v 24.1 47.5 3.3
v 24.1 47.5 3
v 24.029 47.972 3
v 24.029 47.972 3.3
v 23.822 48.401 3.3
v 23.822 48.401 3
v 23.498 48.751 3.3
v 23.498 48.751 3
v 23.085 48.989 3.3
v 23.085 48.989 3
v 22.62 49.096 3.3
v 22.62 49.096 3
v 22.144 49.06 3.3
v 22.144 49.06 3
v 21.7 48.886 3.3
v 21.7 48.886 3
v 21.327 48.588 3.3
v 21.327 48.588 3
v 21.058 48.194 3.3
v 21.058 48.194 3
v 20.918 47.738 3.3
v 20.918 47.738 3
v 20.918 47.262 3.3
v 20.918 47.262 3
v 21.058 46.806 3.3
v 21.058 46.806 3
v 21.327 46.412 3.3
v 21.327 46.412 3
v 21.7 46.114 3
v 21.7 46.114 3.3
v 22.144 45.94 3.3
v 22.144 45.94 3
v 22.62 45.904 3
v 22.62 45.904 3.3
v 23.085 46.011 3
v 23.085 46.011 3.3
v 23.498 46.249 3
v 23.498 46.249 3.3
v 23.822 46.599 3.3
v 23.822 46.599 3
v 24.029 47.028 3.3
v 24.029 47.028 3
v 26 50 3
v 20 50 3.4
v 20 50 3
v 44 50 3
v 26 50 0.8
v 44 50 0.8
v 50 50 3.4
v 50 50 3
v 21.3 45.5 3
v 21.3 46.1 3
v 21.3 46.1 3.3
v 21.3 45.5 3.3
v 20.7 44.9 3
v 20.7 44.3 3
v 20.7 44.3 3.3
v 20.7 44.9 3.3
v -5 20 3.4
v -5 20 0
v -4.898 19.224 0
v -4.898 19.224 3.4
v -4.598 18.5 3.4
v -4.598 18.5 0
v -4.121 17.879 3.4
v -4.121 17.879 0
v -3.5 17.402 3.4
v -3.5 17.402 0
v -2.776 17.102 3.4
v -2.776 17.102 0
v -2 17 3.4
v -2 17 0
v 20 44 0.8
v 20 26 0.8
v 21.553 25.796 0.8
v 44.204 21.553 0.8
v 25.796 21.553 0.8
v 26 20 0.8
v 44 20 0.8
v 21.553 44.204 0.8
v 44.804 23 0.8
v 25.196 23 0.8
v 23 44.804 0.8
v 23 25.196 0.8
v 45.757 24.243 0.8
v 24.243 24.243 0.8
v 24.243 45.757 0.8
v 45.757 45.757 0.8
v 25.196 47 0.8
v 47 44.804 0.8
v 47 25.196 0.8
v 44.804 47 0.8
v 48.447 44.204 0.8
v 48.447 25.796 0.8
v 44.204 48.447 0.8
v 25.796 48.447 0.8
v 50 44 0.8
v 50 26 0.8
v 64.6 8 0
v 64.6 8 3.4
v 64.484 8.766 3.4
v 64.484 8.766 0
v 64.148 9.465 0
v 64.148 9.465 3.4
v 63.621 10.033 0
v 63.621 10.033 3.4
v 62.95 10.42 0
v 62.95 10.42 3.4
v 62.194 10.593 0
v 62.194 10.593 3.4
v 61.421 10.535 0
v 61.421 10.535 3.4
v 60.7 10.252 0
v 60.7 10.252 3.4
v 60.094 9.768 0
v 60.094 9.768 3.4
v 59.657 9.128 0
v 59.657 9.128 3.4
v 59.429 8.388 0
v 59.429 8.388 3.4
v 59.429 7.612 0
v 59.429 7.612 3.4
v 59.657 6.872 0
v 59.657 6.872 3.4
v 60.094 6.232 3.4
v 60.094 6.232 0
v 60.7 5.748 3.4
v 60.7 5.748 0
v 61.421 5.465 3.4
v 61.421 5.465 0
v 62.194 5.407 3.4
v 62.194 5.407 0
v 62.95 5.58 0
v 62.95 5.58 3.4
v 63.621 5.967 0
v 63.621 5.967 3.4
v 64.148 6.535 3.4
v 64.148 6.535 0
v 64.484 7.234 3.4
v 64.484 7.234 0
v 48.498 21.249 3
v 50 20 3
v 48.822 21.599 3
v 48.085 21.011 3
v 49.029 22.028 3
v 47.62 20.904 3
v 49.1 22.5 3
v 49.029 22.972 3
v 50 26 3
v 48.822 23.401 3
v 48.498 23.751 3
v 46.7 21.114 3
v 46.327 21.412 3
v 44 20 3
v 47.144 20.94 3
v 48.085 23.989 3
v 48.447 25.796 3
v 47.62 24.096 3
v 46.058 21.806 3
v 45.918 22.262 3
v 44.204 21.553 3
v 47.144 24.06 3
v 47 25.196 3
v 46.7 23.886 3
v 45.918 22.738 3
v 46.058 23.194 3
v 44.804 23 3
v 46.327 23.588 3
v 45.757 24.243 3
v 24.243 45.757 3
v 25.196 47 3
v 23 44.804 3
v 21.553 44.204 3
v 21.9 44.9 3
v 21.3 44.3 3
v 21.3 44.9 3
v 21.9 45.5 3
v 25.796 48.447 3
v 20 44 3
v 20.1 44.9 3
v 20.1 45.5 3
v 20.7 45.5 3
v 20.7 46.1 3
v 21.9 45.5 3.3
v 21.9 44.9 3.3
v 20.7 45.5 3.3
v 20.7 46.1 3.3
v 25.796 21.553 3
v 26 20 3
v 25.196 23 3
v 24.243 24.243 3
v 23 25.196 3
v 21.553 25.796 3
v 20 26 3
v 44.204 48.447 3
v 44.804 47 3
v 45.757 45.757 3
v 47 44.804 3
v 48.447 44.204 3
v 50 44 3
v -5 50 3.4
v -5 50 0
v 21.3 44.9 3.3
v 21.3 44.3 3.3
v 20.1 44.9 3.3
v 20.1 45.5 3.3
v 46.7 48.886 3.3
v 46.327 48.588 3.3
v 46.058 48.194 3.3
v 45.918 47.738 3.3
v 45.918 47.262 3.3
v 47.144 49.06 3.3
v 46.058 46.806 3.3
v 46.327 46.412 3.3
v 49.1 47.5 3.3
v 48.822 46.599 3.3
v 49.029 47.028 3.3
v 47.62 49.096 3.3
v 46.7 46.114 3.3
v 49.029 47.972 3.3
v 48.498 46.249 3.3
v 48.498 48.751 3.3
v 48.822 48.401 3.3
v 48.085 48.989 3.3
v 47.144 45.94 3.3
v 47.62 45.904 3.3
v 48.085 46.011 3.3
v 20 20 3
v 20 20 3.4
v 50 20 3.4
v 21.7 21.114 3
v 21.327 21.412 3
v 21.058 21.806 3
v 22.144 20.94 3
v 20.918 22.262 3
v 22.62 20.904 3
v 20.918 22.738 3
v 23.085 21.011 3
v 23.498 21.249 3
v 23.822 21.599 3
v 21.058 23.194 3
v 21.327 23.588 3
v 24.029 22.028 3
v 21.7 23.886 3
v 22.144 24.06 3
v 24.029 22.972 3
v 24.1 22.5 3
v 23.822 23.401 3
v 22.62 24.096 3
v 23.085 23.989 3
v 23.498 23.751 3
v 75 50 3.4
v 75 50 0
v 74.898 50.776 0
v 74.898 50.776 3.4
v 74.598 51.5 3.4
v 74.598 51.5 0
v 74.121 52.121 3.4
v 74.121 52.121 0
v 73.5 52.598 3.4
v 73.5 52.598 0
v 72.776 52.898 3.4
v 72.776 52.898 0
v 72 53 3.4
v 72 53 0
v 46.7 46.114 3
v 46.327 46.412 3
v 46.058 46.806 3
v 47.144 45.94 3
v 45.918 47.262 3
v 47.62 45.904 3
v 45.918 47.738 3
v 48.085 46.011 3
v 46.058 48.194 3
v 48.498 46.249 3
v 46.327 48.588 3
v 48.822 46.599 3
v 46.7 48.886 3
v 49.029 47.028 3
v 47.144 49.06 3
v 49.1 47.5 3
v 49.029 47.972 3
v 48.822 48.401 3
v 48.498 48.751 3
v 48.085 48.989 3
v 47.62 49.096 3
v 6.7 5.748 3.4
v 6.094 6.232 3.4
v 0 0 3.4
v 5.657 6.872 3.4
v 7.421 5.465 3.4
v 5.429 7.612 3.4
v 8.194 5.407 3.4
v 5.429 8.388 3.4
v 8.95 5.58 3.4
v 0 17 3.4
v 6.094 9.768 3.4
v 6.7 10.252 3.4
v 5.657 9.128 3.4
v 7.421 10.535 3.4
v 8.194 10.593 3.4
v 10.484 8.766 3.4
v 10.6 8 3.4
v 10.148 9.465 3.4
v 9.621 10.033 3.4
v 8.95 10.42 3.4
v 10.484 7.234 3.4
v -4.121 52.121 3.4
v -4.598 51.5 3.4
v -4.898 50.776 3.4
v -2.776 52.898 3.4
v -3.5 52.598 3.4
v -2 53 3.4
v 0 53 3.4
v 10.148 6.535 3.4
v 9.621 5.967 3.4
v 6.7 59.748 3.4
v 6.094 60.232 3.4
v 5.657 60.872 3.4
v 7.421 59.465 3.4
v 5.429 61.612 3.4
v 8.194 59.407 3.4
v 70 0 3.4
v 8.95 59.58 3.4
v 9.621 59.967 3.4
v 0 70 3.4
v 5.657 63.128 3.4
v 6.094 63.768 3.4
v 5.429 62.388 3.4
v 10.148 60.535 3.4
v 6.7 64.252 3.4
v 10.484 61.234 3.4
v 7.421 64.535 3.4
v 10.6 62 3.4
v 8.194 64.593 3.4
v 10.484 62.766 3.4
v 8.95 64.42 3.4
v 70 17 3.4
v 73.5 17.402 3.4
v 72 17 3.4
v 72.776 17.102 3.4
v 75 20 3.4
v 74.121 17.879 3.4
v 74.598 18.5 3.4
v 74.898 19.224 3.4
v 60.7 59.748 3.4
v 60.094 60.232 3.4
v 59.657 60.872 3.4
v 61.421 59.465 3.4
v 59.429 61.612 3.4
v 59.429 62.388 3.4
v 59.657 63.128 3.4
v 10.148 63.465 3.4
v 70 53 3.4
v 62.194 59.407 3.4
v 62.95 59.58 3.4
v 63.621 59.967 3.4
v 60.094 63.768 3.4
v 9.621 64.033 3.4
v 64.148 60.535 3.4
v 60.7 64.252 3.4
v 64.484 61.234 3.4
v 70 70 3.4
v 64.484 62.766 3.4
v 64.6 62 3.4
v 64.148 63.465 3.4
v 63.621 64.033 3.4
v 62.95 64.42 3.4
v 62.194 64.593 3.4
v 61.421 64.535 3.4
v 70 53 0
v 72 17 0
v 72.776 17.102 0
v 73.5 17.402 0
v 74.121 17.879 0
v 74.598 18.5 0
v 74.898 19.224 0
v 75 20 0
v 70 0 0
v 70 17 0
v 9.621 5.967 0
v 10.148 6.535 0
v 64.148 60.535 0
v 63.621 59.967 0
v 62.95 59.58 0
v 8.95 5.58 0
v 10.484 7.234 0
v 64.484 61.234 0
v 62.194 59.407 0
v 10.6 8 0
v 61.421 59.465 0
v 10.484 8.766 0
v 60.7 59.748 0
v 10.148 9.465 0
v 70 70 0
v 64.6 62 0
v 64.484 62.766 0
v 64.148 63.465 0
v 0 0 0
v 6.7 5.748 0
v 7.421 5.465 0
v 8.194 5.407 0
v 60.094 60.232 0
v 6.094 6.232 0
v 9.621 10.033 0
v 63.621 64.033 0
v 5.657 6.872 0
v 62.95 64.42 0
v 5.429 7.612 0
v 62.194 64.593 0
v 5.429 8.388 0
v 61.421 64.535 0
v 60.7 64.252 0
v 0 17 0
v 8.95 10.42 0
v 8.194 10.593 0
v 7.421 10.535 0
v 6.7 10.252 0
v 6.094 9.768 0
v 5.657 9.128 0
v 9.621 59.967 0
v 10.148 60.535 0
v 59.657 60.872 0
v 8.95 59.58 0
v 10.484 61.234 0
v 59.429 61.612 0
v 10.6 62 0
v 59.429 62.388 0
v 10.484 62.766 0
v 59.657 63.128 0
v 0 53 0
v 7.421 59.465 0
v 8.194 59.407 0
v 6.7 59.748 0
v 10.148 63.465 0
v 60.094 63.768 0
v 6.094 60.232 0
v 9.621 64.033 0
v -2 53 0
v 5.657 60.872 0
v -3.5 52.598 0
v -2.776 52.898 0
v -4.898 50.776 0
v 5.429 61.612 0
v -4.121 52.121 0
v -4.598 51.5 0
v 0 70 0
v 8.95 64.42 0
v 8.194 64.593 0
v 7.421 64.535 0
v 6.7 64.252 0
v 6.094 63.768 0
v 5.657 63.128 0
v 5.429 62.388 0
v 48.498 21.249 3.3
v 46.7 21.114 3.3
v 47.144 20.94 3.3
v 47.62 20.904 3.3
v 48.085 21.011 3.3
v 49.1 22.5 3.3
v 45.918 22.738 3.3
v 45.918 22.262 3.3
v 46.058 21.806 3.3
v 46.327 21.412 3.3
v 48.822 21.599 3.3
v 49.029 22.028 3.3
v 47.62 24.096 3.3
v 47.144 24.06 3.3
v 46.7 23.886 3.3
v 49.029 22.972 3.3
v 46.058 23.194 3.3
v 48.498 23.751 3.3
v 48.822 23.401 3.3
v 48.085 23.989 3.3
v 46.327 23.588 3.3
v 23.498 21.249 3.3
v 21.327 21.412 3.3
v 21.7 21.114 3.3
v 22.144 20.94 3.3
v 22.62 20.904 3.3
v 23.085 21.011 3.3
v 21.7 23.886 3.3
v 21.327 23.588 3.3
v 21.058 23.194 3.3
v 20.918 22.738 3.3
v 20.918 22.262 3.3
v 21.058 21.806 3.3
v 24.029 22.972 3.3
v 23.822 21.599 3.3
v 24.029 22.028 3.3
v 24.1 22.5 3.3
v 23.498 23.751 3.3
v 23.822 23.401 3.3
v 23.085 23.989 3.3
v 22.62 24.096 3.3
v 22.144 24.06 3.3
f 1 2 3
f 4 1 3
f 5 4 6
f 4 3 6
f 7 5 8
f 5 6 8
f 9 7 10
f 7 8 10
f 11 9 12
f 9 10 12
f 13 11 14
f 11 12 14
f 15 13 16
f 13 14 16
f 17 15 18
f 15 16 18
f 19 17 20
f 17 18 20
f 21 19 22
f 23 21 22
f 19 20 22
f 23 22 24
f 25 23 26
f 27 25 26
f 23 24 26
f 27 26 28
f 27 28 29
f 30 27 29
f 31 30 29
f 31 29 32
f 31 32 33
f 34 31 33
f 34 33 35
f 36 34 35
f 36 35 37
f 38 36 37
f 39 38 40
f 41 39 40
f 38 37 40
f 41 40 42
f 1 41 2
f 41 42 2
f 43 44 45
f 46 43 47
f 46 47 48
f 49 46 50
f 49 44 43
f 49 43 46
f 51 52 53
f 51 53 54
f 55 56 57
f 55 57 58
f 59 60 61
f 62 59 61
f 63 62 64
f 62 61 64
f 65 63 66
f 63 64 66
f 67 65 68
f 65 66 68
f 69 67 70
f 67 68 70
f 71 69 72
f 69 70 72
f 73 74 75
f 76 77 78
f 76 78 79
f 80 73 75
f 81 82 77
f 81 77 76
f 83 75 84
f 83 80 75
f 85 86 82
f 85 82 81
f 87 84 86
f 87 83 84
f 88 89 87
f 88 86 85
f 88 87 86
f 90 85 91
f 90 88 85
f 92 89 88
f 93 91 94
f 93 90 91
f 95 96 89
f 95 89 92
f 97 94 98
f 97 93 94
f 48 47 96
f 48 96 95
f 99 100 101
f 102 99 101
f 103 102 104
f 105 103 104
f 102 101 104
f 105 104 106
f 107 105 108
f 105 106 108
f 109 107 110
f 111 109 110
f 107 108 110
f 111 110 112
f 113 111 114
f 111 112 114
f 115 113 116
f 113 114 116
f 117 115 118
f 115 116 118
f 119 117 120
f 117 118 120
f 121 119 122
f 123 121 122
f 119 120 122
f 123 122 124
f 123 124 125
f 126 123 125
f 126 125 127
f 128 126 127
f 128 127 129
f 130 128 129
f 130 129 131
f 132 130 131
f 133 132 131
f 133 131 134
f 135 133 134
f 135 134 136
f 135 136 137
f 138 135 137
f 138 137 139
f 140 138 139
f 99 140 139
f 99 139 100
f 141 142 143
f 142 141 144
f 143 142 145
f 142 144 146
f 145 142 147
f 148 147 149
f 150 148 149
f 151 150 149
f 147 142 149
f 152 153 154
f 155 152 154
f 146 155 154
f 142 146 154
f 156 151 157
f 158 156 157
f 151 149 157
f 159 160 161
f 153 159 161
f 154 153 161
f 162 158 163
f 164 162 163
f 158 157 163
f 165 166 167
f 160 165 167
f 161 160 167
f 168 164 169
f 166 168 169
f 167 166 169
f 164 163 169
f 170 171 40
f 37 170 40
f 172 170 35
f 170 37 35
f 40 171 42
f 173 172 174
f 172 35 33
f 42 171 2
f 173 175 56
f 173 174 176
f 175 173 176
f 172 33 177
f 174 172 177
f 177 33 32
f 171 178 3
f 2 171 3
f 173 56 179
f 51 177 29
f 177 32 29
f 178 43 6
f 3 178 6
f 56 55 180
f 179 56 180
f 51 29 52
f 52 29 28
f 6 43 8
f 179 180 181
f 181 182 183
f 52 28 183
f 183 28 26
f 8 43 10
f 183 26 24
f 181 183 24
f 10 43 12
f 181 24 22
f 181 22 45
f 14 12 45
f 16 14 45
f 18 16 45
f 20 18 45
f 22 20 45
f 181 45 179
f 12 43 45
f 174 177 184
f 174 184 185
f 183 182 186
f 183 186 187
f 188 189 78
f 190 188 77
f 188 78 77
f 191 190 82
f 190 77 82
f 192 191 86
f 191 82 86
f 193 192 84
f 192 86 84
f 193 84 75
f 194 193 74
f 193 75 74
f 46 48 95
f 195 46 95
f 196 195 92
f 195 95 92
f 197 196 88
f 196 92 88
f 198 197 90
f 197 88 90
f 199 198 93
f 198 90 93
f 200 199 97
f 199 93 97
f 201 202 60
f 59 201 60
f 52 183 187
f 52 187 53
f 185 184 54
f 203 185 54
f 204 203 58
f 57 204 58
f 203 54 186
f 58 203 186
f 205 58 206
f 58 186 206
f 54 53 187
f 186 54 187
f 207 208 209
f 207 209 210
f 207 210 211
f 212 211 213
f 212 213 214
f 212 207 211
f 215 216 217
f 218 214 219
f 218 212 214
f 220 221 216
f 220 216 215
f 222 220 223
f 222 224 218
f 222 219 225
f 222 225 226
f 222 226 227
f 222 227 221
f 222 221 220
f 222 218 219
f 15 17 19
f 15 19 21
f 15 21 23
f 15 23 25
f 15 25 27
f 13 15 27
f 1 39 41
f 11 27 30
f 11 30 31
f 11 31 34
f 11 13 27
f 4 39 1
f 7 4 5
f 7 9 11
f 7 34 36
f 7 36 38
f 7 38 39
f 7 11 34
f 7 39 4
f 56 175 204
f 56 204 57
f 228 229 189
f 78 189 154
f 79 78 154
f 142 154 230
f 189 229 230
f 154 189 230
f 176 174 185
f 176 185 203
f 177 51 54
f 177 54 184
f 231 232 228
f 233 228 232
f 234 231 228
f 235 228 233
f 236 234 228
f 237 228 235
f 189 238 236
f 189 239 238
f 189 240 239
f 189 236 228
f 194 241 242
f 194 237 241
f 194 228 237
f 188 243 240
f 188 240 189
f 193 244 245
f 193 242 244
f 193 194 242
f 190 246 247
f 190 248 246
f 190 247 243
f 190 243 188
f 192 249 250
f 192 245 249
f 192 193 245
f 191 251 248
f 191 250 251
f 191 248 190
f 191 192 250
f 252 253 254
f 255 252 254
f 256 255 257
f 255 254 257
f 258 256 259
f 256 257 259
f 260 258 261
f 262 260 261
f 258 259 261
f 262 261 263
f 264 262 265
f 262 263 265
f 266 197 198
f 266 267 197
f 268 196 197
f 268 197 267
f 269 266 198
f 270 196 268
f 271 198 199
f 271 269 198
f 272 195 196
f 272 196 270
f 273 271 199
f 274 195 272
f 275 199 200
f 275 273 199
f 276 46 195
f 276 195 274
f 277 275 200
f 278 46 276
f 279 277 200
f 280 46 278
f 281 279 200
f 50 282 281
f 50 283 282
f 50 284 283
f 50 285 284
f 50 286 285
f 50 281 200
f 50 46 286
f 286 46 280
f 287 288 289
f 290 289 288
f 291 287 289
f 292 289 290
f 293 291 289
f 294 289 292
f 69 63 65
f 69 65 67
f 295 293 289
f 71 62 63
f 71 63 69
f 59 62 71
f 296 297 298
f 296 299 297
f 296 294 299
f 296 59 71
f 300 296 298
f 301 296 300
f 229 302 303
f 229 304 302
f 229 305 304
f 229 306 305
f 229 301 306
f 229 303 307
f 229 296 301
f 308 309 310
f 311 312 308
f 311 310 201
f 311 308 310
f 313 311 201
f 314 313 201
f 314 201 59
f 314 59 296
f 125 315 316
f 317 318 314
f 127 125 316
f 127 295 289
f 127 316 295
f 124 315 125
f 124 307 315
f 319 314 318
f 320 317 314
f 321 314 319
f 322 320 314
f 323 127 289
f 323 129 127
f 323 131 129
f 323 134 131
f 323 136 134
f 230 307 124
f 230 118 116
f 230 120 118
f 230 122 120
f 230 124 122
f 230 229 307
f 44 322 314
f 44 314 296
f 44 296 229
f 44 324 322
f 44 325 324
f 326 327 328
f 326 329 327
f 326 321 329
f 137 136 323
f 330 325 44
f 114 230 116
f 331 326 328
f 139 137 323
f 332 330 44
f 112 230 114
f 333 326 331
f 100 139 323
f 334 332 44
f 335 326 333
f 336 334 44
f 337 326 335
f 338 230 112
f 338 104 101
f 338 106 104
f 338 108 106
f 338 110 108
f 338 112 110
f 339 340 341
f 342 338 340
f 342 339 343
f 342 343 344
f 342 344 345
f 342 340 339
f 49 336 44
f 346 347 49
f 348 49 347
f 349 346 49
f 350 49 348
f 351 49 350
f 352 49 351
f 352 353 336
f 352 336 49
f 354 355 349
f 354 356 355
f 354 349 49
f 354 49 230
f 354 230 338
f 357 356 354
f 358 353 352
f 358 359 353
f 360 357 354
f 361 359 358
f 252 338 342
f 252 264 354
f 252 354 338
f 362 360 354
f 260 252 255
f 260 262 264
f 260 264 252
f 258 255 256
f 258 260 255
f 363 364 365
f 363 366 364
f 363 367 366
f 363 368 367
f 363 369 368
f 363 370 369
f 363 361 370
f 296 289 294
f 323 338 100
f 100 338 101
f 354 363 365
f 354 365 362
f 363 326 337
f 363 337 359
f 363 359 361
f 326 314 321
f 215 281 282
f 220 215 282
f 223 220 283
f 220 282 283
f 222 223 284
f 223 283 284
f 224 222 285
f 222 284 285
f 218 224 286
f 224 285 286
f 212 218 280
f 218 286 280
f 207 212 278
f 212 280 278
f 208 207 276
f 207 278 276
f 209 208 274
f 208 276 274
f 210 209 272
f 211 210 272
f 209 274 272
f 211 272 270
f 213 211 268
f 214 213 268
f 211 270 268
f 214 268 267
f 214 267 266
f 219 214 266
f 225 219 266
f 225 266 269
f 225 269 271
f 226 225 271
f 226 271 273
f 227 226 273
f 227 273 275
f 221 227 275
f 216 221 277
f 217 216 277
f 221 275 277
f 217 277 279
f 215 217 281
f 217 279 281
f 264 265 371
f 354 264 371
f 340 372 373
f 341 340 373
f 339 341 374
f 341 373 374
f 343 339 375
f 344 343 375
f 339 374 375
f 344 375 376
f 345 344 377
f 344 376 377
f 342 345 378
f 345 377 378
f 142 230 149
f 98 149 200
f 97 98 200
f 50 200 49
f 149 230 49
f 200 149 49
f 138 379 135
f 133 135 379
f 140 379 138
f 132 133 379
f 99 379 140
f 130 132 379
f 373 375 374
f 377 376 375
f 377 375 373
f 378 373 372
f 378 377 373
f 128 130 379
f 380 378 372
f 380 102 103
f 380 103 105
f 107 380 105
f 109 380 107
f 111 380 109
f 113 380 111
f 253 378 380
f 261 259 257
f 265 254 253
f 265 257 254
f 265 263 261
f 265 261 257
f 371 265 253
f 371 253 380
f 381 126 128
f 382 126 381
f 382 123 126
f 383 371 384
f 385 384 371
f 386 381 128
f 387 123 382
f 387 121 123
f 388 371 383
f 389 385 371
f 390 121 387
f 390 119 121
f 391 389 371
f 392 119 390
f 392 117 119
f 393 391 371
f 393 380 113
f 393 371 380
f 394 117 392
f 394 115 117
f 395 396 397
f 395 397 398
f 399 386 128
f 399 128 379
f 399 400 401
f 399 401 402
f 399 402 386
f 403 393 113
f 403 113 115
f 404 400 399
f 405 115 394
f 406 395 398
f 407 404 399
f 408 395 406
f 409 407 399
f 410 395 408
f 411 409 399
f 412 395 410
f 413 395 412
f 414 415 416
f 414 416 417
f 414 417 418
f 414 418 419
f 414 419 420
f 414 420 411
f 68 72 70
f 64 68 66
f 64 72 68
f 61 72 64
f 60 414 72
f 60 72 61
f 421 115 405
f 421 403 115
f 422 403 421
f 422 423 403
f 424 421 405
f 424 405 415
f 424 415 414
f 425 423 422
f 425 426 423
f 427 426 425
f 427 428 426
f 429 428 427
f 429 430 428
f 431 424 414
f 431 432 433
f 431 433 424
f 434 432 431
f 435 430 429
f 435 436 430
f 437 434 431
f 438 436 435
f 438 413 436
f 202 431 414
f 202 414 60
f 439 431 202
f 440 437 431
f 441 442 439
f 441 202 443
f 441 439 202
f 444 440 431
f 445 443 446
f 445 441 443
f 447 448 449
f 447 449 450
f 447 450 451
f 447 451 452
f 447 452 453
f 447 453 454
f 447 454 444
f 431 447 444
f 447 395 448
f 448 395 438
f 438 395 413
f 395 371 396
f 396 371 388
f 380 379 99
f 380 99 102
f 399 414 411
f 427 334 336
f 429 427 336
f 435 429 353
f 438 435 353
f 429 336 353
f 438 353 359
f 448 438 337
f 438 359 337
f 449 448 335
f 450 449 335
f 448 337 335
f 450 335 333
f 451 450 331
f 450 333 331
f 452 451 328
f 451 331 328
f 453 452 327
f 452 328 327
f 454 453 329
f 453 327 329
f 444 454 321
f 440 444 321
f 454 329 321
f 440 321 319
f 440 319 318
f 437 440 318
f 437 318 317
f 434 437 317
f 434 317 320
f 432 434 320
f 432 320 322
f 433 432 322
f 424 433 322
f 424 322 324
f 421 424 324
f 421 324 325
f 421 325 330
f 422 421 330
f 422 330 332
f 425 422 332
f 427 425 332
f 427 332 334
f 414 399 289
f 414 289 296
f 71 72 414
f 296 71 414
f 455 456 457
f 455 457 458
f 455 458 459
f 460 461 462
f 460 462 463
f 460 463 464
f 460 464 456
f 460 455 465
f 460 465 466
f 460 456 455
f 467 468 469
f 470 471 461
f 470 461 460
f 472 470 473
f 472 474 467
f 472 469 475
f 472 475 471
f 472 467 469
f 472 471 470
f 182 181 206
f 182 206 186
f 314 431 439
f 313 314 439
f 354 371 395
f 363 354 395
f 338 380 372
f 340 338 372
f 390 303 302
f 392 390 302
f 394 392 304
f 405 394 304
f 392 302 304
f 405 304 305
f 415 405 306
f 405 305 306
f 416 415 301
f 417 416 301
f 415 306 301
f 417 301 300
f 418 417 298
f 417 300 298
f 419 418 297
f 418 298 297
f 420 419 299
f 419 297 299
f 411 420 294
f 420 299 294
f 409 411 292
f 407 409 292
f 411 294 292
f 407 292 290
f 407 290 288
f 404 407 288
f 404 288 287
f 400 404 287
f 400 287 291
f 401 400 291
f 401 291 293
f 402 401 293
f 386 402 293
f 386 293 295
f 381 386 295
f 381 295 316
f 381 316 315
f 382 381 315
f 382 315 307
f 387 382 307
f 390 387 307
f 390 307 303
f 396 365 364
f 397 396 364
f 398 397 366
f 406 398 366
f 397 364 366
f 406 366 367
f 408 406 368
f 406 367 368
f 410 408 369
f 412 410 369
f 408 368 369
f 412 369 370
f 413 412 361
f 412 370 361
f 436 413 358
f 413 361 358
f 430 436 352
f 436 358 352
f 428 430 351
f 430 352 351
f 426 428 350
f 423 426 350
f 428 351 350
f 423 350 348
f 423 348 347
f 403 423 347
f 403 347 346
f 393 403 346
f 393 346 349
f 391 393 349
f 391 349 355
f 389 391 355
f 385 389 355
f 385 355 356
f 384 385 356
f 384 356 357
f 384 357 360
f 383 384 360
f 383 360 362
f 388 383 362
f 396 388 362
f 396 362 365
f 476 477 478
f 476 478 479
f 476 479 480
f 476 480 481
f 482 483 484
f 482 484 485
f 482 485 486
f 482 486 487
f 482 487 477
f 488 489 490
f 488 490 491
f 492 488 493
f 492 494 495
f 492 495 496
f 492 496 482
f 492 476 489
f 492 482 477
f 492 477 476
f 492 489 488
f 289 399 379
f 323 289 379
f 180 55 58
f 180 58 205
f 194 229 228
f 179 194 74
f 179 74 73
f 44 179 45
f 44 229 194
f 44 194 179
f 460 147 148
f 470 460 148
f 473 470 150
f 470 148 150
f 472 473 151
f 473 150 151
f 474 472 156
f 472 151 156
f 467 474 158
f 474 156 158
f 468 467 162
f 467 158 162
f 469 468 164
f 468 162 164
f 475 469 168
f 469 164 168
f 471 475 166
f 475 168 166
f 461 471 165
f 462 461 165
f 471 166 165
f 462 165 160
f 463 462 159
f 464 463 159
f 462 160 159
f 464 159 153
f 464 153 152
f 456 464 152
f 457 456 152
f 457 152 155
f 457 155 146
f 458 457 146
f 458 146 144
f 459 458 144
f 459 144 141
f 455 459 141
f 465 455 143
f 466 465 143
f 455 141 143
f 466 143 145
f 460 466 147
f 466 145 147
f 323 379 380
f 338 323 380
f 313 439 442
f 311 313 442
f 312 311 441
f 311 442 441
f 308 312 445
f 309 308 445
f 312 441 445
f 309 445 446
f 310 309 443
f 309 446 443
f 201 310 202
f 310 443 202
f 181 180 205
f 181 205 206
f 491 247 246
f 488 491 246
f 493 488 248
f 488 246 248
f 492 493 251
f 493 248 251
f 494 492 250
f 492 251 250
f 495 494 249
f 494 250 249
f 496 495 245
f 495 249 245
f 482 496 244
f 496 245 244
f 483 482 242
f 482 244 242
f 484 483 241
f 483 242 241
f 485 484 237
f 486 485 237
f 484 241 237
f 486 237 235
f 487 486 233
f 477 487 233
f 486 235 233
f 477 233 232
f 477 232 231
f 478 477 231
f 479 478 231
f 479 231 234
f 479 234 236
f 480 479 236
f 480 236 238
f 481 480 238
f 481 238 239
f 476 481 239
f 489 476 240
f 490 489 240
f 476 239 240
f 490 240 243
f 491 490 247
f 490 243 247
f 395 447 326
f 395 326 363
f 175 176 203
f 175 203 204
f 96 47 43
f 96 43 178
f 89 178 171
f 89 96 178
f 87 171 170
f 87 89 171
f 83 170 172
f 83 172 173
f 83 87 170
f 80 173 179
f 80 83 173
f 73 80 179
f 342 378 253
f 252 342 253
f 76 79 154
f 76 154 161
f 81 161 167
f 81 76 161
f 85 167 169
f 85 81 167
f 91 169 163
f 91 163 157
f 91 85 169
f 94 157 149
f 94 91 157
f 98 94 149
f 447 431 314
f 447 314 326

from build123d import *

# Parameters (mm, degrees)
SKETCH_1_W          = 70
SKETCH_1_H          = 70
EXTRUDE_1_DEPTH     = 3.4
SKETCH_2_W          = 30
SKETCH_2_H          = 30
CUT_EXTRUDE_1_DEPTH = 2.6
SKETCH_3_R          = 2.6
CUT_EXTRUDE_2_DEPTH = 4.4
EXTRUDE_2_DEPTH     = 3
SKETCH_6_R          = 1.6
EXTRUDE_3_DEPTH     = 0.3


with BuildPart() as part:
    # 草图1 → 凸台-拉伸1 (new body)
    with BuildSketch(Plane.XY):
        with BuildLine():
            Line((-2, 17), (0, 17))
            Line((0, 17), (0, 53))
            Line((0, 53), (-2, 53))
            ThreePointArc((-2, 53), (-4.121320344, 52.121320344), (-5, 50))
            Line((-5, 50), (-5, 20))
            ThreePointArc((-5, 20), (-4.121320344, 17.878679656), (-2, 17))
        make_face()
        with Locations((35, 35)):
            Rectangle(SKETCH_1_W, SKETCH_1_H)
        with BuildLine():
            Line((70, 53), (70, 17))
            Line((70, 17), (72, 17))
            ThreePointArc((72, 17), (74.121320344, 17.878679656), (75, 20))
            Line((75, 20), (75, 50))
            ThreePointArc((75, 50), (74.121320344, 52.121320344), (72, 53))
            Line((72, 53), (70, 53))
        make_face()
    extrude(amount=EXTRUDE_1_DEPTH)

    # 草图2 → 切除-拉伸1 (cut)
    with BuildSketch(Plane.XY.offset(3.4)):
        with Locations((35, 35)):
            Rectangle(SKETCH_2_W, SKETCH_2_H)
    extrude(amount=-CUT_EXTRUDE_1_DEPTH, mode=Mode.SUBTRACT)

    # 草图3 → 切除-拉伸2 (cut, through all)
    with BuildSketch(Plane.XY.offset(3.4)):
        with Locations((8, 62)):
            Circle(SKETCH_3_R)
        with Locations((62, 62)):
            Circle(SKETCH_3_R)
        with Locations((8, 8)):
            Circle(SKETCH_3_R)
        with Locations((62, 8)):
            Circle(SKETCH_3_R)
    extrude(amount=-CUT_EXTRUDE_2_DEPTH, mode=Mode.SUBTRACT)

    # 草图4 → 凸台-拉伸2 (add)
    with BuildSketch(Plane.XY):
        with BuildLine():
            Line((20, 44), (20, 50))
            Line((20, 50), (26, 50))
            ThreePointArc((26, 50), (24.242640687, 45.757359313), (20, 44))
        make_face()
        with BuildLine():
            Line((50, 44), (50, 50))
            Line((50, 50), (44, 50))
            ThreePointArc((44, 50), (45.757359313, 45.757359313), (50, 44))
        make_face()
        with BuildLine():
            Line((50, 20), (44, 20))
            ThreePointArc((44, 20), (45.757359313, 24.242640687), (50, 26))
            Line((50, 26), (50, 20))
        make_face()
        with BuildLine():
            Line((20, 26), (20, 20))
            Line((20, 20), (26, 20))
            ThreePointArc((26, 20), (24.242640687, 24.242640687), (20, 26))
        make_face()
    extrude(amount=EXTRUDE_2_DEPTH)

    # 草图6 → 凸台-拉伸3 (add)
    with BuildSketch(Plane.XY.offset(3)):
        with Locations((22.5, 47.5)):
            Circle(SKETCH_6_R)
        with Locations((47.5, 47.5)):
            Circle(SKETCH_6_R)
        with Locations((47.5, 22.5)):
            Circle(SKETCH_6_R)
        with Locations((22.5, 22.5)):
            Circle(SKETCH_6_R)
        Polygon((20.1, 45.5), (20.7, 45.5), (20.7, 46.1), (21.3, 46.1), (21.3, 45.5), (21.9, 45.5), (21.9, 44.9), (21.3, 44.9), (21.3, 44.3), (20.7, 44.3), (20.7, 44.9), (20.1, 44.9), align=None)
    extrude(amount=EXTRUDE_3_DEPTH)


solid = part.part
